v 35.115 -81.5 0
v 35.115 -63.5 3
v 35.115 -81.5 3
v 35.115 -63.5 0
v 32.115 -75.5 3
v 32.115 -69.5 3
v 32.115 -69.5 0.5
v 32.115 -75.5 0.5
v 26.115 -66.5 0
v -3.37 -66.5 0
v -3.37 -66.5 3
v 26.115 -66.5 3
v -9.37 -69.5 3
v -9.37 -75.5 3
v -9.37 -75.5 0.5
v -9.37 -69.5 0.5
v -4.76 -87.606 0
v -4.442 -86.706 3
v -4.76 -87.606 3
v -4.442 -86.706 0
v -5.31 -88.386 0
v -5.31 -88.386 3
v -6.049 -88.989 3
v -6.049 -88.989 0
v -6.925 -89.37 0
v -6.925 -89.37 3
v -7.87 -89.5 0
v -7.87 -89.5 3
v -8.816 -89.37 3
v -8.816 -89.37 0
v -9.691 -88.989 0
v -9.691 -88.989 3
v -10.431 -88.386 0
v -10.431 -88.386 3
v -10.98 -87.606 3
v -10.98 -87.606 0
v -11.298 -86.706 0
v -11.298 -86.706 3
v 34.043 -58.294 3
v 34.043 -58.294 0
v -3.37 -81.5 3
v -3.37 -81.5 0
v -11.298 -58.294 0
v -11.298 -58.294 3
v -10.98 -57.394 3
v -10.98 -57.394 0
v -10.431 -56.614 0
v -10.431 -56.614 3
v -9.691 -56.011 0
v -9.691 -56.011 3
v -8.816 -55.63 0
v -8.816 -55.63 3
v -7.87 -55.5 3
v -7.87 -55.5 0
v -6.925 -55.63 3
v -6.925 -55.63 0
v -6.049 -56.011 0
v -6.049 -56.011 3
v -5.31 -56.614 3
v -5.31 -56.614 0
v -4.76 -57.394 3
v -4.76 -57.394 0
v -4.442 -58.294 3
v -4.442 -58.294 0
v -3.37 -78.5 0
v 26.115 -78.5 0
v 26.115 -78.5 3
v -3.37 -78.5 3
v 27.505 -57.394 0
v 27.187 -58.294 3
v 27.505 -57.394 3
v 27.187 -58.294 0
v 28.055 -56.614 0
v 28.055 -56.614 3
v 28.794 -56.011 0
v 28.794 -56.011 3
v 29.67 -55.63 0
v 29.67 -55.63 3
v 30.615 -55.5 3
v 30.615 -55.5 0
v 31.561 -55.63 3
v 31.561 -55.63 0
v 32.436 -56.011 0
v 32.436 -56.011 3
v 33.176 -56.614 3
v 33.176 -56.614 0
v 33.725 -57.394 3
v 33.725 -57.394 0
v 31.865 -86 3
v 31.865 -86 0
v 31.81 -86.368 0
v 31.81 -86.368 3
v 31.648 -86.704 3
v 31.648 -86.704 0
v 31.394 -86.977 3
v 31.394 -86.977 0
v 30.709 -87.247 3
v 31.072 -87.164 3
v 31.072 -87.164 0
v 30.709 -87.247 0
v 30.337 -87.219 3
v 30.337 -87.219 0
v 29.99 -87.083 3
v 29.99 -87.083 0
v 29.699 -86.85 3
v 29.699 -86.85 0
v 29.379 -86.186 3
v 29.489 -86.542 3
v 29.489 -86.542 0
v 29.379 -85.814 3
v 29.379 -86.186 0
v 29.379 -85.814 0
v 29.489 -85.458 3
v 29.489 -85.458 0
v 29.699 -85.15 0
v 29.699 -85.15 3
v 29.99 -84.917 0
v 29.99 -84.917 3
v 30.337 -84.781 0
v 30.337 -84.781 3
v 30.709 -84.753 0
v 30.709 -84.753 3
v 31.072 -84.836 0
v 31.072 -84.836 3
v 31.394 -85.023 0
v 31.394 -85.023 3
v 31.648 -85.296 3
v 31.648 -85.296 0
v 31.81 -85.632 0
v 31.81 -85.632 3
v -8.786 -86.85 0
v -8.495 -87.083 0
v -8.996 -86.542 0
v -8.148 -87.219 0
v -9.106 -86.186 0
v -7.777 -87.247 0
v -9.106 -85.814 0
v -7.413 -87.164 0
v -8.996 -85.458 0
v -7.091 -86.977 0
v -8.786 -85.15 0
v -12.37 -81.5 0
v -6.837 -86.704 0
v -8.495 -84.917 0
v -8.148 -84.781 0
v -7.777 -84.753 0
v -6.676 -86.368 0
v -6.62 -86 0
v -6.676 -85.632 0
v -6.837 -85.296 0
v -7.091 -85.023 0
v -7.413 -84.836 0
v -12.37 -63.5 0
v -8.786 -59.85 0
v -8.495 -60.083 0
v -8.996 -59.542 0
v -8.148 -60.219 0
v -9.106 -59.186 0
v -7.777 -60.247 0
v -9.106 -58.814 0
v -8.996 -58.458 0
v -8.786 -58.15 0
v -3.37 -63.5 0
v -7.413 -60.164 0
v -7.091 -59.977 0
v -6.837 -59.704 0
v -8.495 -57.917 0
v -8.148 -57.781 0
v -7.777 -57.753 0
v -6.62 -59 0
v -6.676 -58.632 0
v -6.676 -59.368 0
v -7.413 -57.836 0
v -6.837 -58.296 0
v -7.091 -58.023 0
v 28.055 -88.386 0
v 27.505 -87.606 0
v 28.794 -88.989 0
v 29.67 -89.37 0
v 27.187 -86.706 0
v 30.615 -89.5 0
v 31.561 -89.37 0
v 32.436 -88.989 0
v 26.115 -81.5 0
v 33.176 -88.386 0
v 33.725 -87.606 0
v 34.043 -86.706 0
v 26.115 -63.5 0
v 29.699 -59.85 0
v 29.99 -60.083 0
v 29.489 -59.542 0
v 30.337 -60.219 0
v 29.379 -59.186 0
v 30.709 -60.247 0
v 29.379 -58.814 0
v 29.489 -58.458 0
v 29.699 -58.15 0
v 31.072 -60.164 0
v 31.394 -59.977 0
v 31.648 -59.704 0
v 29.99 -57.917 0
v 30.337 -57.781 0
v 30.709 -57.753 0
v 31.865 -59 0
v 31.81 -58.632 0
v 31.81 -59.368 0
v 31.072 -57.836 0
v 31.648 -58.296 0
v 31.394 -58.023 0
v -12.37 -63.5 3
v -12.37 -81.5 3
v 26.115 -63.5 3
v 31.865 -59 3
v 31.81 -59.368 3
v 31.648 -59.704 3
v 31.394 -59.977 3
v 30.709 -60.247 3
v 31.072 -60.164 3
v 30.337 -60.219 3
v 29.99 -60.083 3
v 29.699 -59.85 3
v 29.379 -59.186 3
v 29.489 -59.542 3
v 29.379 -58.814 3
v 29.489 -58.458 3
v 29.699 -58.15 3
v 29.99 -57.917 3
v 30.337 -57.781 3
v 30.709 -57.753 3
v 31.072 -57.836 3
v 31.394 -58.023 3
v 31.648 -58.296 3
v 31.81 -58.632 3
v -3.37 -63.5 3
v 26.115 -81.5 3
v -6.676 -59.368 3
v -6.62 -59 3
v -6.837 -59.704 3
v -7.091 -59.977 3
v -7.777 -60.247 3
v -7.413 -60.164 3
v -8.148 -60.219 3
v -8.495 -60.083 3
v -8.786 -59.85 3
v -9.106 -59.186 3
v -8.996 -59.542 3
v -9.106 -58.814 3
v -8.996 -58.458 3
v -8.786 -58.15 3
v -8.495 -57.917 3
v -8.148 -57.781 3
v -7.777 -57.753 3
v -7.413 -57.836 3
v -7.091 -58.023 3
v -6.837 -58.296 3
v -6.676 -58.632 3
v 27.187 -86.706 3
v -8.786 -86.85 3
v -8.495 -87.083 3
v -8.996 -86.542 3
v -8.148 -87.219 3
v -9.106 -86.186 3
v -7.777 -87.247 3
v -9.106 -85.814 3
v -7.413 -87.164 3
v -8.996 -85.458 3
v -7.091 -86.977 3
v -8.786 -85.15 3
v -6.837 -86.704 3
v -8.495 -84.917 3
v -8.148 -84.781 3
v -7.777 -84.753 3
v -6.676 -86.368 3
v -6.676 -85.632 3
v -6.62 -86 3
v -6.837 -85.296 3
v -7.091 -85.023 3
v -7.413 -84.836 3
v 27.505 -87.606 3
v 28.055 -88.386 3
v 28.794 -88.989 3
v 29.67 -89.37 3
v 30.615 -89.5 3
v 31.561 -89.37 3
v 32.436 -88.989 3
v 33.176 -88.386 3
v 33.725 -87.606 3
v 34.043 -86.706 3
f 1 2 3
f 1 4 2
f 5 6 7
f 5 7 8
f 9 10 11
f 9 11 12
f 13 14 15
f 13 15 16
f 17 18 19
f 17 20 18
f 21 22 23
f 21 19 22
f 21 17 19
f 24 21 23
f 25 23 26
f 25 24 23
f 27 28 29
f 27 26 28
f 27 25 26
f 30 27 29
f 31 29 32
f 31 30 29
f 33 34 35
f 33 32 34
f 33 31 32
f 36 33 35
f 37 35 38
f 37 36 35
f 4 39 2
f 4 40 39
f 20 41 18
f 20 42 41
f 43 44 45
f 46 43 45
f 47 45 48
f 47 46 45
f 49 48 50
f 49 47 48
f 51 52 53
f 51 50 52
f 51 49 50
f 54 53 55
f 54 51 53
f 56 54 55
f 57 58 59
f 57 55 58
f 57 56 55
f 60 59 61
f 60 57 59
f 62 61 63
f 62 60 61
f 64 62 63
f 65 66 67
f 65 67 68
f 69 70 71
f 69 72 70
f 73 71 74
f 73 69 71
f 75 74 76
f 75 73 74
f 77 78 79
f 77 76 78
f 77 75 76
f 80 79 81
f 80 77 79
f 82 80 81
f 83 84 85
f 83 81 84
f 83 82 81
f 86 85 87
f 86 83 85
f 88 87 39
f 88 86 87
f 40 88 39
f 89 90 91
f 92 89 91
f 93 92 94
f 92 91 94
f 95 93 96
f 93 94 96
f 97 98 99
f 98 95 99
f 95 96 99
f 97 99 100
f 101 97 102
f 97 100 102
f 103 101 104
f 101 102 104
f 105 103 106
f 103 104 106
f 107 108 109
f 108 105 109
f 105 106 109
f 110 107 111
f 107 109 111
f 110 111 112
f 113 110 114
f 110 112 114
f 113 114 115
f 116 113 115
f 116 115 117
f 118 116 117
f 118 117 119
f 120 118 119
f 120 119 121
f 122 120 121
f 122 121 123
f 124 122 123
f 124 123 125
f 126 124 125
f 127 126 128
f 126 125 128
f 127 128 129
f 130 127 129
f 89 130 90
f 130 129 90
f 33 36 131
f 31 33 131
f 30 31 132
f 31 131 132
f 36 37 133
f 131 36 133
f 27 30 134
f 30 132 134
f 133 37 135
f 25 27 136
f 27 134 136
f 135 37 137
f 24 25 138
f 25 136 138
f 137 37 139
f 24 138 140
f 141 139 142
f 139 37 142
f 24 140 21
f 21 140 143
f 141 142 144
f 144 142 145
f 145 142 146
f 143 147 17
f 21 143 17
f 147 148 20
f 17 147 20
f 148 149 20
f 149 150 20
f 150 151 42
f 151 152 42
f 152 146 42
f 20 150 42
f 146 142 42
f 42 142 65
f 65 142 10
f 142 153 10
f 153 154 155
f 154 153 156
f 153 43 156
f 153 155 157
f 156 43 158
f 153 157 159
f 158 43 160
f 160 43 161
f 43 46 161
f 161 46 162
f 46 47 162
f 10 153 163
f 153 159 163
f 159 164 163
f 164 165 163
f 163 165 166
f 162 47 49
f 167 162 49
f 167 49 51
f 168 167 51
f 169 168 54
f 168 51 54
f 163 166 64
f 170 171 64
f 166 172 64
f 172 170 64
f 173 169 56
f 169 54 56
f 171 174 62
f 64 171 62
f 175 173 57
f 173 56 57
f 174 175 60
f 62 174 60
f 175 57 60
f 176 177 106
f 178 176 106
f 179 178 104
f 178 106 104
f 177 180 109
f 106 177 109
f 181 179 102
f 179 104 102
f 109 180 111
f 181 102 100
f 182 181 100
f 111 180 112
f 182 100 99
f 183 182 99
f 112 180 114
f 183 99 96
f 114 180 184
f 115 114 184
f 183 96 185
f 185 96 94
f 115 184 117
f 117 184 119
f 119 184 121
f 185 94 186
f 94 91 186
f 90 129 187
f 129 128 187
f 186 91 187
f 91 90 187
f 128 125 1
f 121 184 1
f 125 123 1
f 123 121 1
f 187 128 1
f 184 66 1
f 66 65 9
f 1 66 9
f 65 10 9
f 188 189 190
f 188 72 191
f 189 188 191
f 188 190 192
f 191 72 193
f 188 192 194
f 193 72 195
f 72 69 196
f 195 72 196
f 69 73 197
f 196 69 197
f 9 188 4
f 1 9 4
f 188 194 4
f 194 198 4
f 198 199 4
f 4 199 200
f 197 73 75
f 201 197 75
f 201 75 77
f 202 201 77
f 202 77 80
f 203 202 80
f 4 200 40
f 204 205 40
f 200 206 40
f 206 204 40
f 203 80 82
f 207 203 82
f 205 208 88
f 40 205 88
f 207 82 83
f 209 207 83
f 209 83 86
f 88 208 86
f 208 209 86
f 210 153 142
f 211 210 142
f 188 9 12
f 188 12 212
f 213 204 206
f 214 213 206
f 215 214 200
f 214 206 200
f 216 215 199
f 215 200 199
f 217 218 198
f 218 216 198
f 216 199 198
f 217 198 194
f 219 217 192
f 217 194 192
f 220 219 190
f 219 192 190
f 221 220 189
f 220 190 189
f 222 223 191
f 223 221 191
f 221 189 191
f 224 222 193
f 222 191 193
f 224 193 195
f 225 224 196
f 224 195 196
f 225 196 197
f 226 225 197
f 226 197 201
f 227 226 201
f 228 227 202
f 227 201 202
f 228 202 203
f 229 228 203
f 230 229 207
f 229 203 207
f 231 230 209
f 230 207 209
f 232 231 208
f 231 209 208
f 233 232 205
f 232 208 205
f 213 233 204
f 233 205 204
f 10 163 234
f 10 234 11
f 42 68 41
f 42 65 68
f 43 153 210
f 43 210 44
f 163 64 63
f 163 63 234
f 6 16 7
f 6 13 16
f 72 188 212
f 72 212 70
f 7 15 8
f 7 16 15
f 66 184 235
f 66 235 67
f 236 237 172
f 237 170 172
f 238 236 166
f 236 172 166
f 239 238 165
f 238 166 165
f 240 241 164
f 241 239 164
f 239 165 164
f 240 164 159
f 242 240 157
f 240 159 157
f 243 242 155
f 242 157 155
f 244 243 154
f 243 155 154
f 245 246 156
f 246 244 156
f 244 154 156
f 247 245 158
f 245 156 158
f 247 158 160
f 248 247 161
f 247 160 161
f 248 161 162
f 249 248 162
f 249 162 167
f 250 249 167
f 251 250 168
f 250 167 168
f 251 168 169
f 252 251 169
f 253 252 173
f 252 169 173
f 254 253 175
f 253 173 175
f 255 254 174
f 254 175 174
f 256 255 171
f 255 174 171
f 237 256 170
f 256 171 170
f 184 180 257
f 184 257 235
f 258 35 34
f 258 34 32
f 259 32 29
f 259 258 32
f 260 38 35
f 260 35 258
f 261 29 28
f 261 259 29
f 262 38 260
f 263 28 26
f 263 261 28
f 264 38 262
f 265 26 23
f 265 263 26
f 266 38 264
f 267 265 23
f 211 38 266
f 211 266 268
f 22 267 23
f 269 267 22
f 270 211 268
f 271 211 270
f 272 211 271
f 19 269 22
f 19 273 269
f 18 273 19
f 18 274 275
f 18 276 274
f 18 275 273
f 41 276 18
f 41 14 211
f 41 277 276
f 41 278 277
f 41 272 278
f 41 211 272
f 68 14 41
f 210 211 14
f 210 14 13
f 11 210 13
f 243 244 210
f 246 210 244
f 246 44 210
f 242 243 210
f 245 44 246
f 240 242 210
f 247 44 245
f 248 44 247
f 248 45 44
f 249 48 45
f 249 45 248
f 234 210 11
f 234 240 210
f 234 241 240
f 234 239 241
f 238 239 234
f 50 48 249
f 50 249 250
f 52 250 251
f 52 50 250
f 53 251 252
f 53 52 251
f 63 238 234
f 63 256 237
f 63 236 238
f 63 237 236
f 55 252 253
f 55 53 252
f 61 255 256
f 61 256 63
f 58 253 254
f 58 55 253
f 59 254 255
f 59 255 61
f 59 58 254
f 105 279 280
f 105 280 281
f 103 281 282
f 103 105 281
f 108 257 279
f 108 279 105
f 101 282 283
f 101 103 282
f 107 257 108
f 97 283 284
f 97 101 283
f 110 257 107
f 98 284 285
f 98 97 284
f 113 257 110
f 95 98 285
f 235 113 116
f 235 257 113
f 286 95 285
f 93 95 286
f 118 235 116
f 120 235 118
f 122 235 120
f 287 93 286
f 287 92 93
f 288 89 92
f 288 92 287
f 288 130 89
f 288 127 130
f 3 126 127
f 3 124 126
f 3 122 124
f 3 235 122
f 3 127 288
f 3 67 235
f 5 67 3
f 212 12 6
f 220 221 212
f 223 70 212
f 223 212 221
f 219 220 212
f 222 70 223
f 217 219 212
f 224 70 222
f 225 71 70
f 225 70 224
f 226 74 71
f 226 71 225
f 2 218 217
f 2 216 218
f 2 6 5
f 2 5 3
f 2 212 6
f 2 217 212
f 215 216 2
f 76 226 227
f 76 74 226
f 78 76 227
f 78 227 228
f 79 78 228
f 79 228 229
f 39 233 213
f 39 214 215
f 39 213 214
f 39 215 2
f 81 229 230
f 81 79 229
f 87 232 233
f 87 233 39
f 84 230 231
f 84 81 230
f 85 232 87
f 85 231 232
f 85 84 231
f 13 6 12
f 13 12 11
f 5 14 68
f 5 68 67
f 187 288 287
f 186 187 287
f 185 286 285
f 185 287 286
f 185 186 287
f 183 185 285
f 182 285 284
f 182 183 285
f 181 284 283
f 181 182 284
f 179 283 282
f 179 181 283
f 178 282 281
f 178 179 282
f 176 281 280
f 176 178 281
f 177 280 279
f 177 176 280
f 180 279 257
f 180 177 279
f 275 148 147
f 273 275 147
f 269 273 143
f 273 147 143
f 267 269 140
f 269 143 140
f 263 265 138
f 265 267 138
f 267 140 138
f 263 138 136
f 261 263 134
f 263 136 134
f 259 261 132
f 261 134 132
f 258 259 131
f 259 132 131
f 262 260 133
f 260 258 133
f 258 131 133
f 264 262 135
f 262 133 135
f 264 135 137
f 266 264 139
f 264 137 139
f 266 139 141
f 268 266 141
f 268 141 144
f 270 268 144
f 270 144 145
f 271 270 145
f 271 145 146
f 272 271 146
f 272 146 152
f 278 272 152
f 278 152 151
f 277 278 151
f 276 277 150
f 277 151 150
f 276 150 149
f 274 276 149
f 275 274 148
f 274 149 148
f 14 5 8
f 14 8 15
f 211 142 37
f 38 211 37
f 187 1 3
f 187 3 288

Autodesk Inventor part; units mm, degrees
ref_plane "YZ Plane" through (0, 0, 0) normal (1, 0, 0) x (0, 1, 0)
ref_plane "XZ Plane" through (0, 0, 0) normal (0, 1, 0) x (-1, 0, 0)
ref_plane "XY Plane" through (0, 0, 0) normal (0, 0, 1) x (1, 0, 0)
sketch "スケッチ1" plane through (0, 0, 0) normal (0, 0, 1) x (1, 0, 0)
  circle A0 centre (50.4, -4.5) radius 1.5
  circle A1 centre (50.4, -59) radius 1.5
  circle A2 centre (50.4, -86) radius 1.5
  circle A3 centre (50.4, -173.5) radius 1.5
  circle A4 centre (30.9, -4.5) radius 1.5
  circle A5 centre (30.9, -173.5) radius 1.5
  circle A6 centre (75.4, -4.5) radius 1.5
  circle A7 centre (75.4, -173.5) radius 1.5
  line L0 (38.1151, -78.5) -> (38.1151, -81.5)
  arc A8 (36.0151, -81.5) -> (38.1151, -81.5) centre (37.0651, -81.5) ccw
  line L1 (36.0151, -81.5) -> (25.2151, -81.5)
  arc A9 (23.1151, -81.5) -> (25.2151, -81.5) centre (24.1651, -81.5) ccw
  line L2 (23.1151, -81.5) -> (23.1151, -78.5)
  arc A10 (25.2151, -78.5) -> (23.1151, -78.5) centre (24.1651, -78.5) ccw
  line L3 (25.2151, -78.5) -> (36.0151, -78.5)
  arc A11 (38.1151, -78.5) -> (36.0151, -78.5) centre (37.0651, -78.5) ccw
  line L4 (-15.3701, -66.5) -> (-15.3701, -63.5)
  arc A12 (-13.2701, -63.5) -> (-15.3701, -63.5) centre (-14.3201, -63.5) ccw
  line L5 (-13.2701, -63.5) -> (-2.4701, -63.5)
  arc A13 (-0.3701, -63.5) -> (-2.4701, -63.5) centre (-1.4201, -63.5) ccw
  line L6 (-0.3701, -63.5) -> (-0.3701, -66.5)
  arc A14 (-2.4701, -66.5) -> (-0.3701, -66.5) centre (-1.4201, -66.5) ccw
  line L7 (-2.4701, -66.5) -> (-13.2701, -66.5)
  arc A15 (-15.3701, -66.5) -> (-13.2701, -66.5) centre (-14.3201, -66.5) ccw
  line L8 (-0.3701, -78.5) -> (-0.3701, -81.5)
  arc A16 (-2.4701, -81.5) -> (-0.3701, -81.5) centre (-1.4201, -81.5) ccw
  line L9 (-2.4701, -81.5) -> (-13.2701, -81.5)
  arc A17 (-15.3701, -81.5) -> (-13.2701, -81.5) centre (-14.3201, -81.5) ccw
  line L10 (-15.3701, -81.5) -> (-15.3701, -78.5)
  arc A18 (-13.2701, -78.5) -> (-15.3701, -78.5) centre (-14.3201, -78.5) ccw
  line L11 (-13.2701, -78.5) -> (-2.4701, -78.5)
  arc A19 (-0.3701, -78.5) -> (-2.4701, -78.5) centre (-1.4201, -78.5) ccw
  line L12 (23.1151, -66.5) -> (23.1151, -63.5)
  arc A20 (25.2151, -63.5) -> (23.1151, -63.5) centre (24.1651, -63.5) ccw
  line L13 (25.2151, -63.5) -> (36.0151, -63.5)
  arc A21 (38.1151, -63.5) -> (36.0151, -63.5) centre (37.0651, -63.5) ccw
  line L14 (38.1151, -63.5) -> (38.1151, -66.5)
  arc A22 (36.0151, -66.5) -> (38.1151, -66.5) centre (37.0651, -66.5) ccw
  line L15 (36.0151, -66.5) -> (25.2151, -66.5)
  arc A23 (23.1151, -66.5) -> (25.2151, -66.5) centre (24.1651, -66.5) ccw
  line L16 (-108.585, -50) -> (-111.585, -50)
  line L17 (-111.585, -50) -> (-111.585, -128)
  line L18 (-111.585, -128) -> (-108.585, -128)
  arc A24 (-108.585, -130.1) -> (-108.585, -128) centre (-108.585, -129.05) ccw
  line L19 (-108.585, -130.1) -> (-108.585, -140.9)
  arc A25 (-108.585, -143) -> (-108.585, -140.9) centre (-108.585, -141.95) ccw
  line L20 (-108.585, -143) -> (-111.585, -143)
  line L21 (-111.585, -143) -> (-111.585, -168)
  line L22 (-111.585, -168) -> (-108.585, -168)
  line L23 (-108.585, -168) -> (-108.585, -165)
  arc A26 (-106.485, -165) -> (-108.585, -165) centre (-107.535, -165) ccw
  line L24 (-106.485, -165) -> (-95.685, -165)
  arc A27 (-93.585, -165) -> (-95.685, -165) centre (-94.635, -165) ccw
  line L25 (-93.585, -165) -> (-93.585, -168)
  line L26 (-93.585, -168) -> (-20.5995, -168)
  line L27 (-20.5995, -168) -> (-20.5995, -165)
  arc A28 (-18.4995, -165) -> (-20.5995, -165) centre (-19.5495, -165) ccw
  line L28 (-18.4995, -165) -> (-7.6995, -165)
  arc A29 (-5.5995, -165) -> (-7.6995, -165) centre (-6.6495, -165) ccw
  line L29 (-5.5995, -165) -> (-5.5995, -168)
  line L30 (-5.5995, -168) -> (21.4, -168)
  arc A30 (26.4, -173) -> (21.4, -168) centre (21.4, -173) ccw
  line L31 (26.4, -173) -> (26.4, -178)
  line L32 (26.4, -178) -> (40.3, -178)
  arc A31 (42.4, -178) -> (40.3, -178) centre (41.35, -178) ccw
  line L33 (42.4, -178) -> (42.4, -181)
  line L34 (42.4, -181) -> (67.4, -181)
  line L35 (67.4, -181) -> (67.4, -178)
  arc A32 (69.5, -178) -> (67.4, -178) centre (68.45, -178) ccw
  line L36 (69.5, -178) -> (79.9, -178)
  line L37 (79.9, -178) -> (79.9, -164.3045)
  line L38 (79.9, -164.3045) -> (54.9, -129)
  line L39 (54.9, -129) -> (54.9, -49)
  line L40 (54.9, -49) -> (79.9, -13.6955)
  line L41 (79.9, -13.6955) -> (79.9, 0)
  line L42 (79.9, 0) -> (69.5, 0)
  arc A33 (67.4, 0) -> (69.5, 0) centre (68.45, 0) ccw
  line L43 (67.4, 0) -> (67.4, 3)
  line L44 (67.4, 3) -> (42.4, 3)
  line L45 (42.4, 3) -> (42.4, 0)
  arc A34 (40.3, 0) -> (42.4, 0) centre (41.35, 0) ccw
  line L46 (40.3, 0) -> (26.4, 0)
  line L47 (26.4, 0) -> (26.4, -5)
  arc A35 (21.4, -10) -> (26.4, -5) centre (21.4, -5) ccw
  line L48 (21.4, -10) -> (-5.5995, -10)
  line L49 (-5.5995, -10) -> (-5.5995, -13)
  arc A36 (-7.6995, -13) -> (-5.5995, -13) centre (-6.6495, -13) ccw
  line L50 (-7.6995, -13) -> (-18.4995, -13)
  arc A37 (-20.5995, -13) -> (-18.4995, -13) centre (-19.5495, -13) ccw
  line L51 (-20.5995, -13) -> (-20.5995, -10)
  line L52 (-20.5995, -10) -> (-93.585, -10)
  line L53 (-93.585, -10) -> (-93.585, -13)
  arc A38 (-95.685, -13) -> (-93.585, -13) centre (-94.635, -13) ccw
  line L54 (-95.685, -13) -> (-106.485, -13)
  arc A39 (-108.585, -13) -> (-106.485, -13) centre (-107.535, -13) ccw
  line L55 (-108.585, -13) -> (-108.585, -10)
  line L56 (-108.585, -10) -> (-111.585, -10)
  line L57 (-111.585, -10) -> (-111.585, -35)
  line L58 (-111.585, -35) -> (-108.585, -35)
  arc A40 (-108.585, -37.1) -> (-108.585, -35) centre (-108.585, -36.05) ccw
  line L59 (-108.585, -37.1) -> (-108.585, -47.9)
  arc A41 (-108.585, -50) -> (-108.585, -47.9) centre (-108.585, -48.95) ccw
  circle A42 centre (-13.0995, -160.5) radius 1.5
  circle A43 centre (-7.8701, -86) radius 1.5
  circle A44 centre (-104.085, -42.5) radius 1.5
  circle A45 centre (-101.085, -17.5) radius 1.5
  circle A46 centre (30.6151, -86) radius 1.5
  circle A47 centre (-101.085, -160.5) radius 1.5
  circle A48 centre (-7.8701, -59) radius 1.5
  circle A49 centre (-13.0995, -17.5) radius 1.5
  circle A50 centre (30.6151, -59) radius 1.5
  circle A51 centre (-104.085, -135.5) radius 1.5
  line L60 (41.7169, -52.0665) -> (40.5915, -53.6558)
  arc A52 (38.9593, -54.5) -> (40.5915, -53.6558) centre (38.9593, -52.5) ccw
  line L61 (38.9593, -54.5) -> (24.9, -54.5)
  arc A53 (22.9, -52.5) -> (24.9, -54.5) centre (24.9, -52.5) ccw
  line L62 (22.9, -52.5) -> (22.9, -23.5284)
  arc A54 (26.6491, -22.5585) -> (22.9, -23.5284) centre (24.9, -23.5284) ccw
  line L63 (26.6491, -22.5585) -> (41.8338, -49.9408)
  arc A55 (41.7169, -52.0665) -> (41.8338, -49.9408) centre (40.0847, -50.9107) ccw
  arc A56 (-15.846, -59.7485) -> (-18.3701, -63.5) centre (-14.3201, -63.5) ccw
  line L64 (-18.3701, -63.5) -> (-18.3701, -66.5)
  arc A57 (-18.3701, -66.5) -> (-15.846, -70.2515) centre (-14.3201, -66.5) ccw
  arc A58 (-14.5995, -72.1042) -> (-15.846, -70.2515) centre (-16.5995, -72.1042) ccw
  line L65 (-14.5995, -72.1042) -> (-14.5995, -72.8958)
  arc A59 (-15.846, -74.7485) -> (-14.5995, -72.8958) centre (-16.5995, -72.8958) ccw
  arc A60 (-15.846, -74.7485) -> (-18.3701, -78.5) centre (-14.3201, -78.5) ccw
  line L66 (-18.3701, -78.5) -> (-18.3701, -81.5)
  arc A61 (-18.3701, -81.5) -> (-17.3586, -84.1777) centre (-14.3201, -81.5) ccw
  arc A62 (-18.8591, -87.5) -> (-17.3586, -84.1777) centre (-18.8591, -85.5) ccw
  line L67 (-18.8591, -87.5) -> (-50.8293, -87.5)
  arc A63 (-52.5327, -84.4519) -> (-50.8293, -87.5) centre (-50.8293, -85.5) ccw
  line L68 (-52.5327, -84.4519) -> (-18.3029, -28.8193)
  arc A64 (-14.5995, -29.8674) -> (-18.3029, -28.8193) centre (-16.5995, -29.8674) ccw
  line L69 (-14.5995, -29.8674) -> (-14.5995, -57.8958)
  arc A65 (-15.846, -59.7485) -> (-14.5995, -57.8958) centre (-16.5995, -57.8958) ccw
  arc A66 (36.4558, -117.8675) -> (36.8236, -119.0233) centre (38.4558, -117.8675) ccw
  line L70 (36.8236, -119.0233) -> (41.7169, -125.9335)
  arc A67 (41.8338, -128.0592) -> (41.7169, -125.9335) centre (40.0847, -127.0893) ccw
  line L71 (41.8338, -128.0592) -> (26.6491, -155.4415)
  arc A68 (22.9, -154.4716) -> (26.6491, -155.4415) centre (24.9, -154.4716) ccw
  line L72 (22.9, -154.4716) -> (22.9, -92.5)
  arc A69 (24.9, -90.5) -> (22.9, -92.5) centre (24.9, -92.5) ccw
  line L73 (24.9, -90.5) -> (34.4558, -90.5)
  arc A70 (36.4558, -92.5) -> (34.4558, -90.5) centre (34.4558, -92.5) ccw
  line L74 (36.4558, -92.5) -> (36.4558, -117.8675)
  line L75 (68.3465, -169) -> (30.9, -169)
  arc A71 (30.9, -169) -> (29.938, -169.104) centre (30.9, -173.5) ccw
  arc A72 (27.8884, -168.3202) -> (29.938, -169.104) centre (29.5105, -167.1502) ccw
  arc A73 (27.8884, -168.3202) -> (26.0095, -166.4614) centre (21.4, -173) ccw
  arc A74 (25.4128, -163.8569) -> (26.0095, -166.4614) centre (27.1618, -164.8268) ccw
  line L76 (25.4128, -163.8569) -> (42.8246, -132.4585)
  arc A75 (46.2058, -132.2726) -> (42.8246, -132.4585) centre (44.5736, -133.4285) ccw
  line L77 (46.2058, -132.2726) -> (69.9787, -165.8442)
  arc A76 (68.3465, -169) -> (69.9787, -165.8442) centre (68.3465, -167) ccw
  line L78 (-18.3029, -149.1807) -> (-52.5327, -93.5481)
  arc A77 (-50.8293, -90.5) -> (-52.5327, -93.5481) centre (-50.8293, -92.5) ccw
  line L79 (-50.8293, -90.5) -> (-16.5995, -90.5)
  arc A78 (-14.5995, -92.5) -> (-16.5995, -90.5) centre (-16.5995, -92.5) ccw
  line L80 (-14.5995, -92.5) -> (-14.5995, -148.1326)
  arc A79 (-18.3029, -149.1807) -> (-14.5995, -148.1326) centre (-16.5995, -148.1326) ccw
  line L81 (42.8246, -45.5415) -> (25.4128, -14.1431)
  arc A80 (26.0095, -11.5386) -> (25.4128, -14.1431) centre (27.1618, -13.1732) ccw
  arc A81 (26.0095, -11.5386) -> (27.8884, -9.6798) centre (21.4, -5) ccw
  arc A82 (29.938, -8.896) -> (27.8884, -9.6798) centre (29.5105, -10.8498) ccw
  arc A83 (29.938, -8.896) -> (30.9, -9) centre (30.9, -4.5) ccw
  line L82 (30.9, -9) -> (68.3465, -9)
  arc A84 (69.9787, -12.1558) -> (68.3465, -9) centre (68.3465, -11) ccw
  line L83 (69.9787, -12.1558) -> (46.2058, -45.7274)
  arc A85 (42.8246, -45.5415) -> (46.2058, -45.7274) centre (44.5736, -44.5715) ccw
  arc A86 (-10.6764, -21.2919) -> (-8.7291, -18.572) centre (-13.0995, -17.5) ccw
  arc A87 (-6.7413, -17.049) -> (-8.7291, -18.572) centre (-6.7866, -19.0484) ccw
  arc A88 (-6.7413, -17.049) -> (-2.8272, -14.3388) centre (-6.6495, -13) ccw
  arc A89 (-0.9396, -13) -> (-2.8272, -14.3388) centre (-0.9396, -15) ccw
  line L84 (-0.9396, -13) -> (17.9, -13)
  arc A90 (19.9, -15) -> (17.9, -13) centre (17.9, -15) ccw
  line L85 (19.9, -15) -> (19.9, -52.5)
  arc A91 (17.9, -54.5) -> (19.9, -52.5) centre (17.9, -52.5) ccw
  line L86 (17.9, -54.5) -> (-9.5995, -54.5)
  arc A92 (-11.5995, -52.5) -> (-9.5995, -54.5) centre (-9.5995, -52.5) ccw
  line L87 (-11.5995, -52.5) -> (-11.5995, -22.9772)
  arc A93 (-10.6764, -21.2919) -> (-11.5995, -22.9772) centre (-9.5995, -22.9772) ccw
  line L88 (-88.9251, -13) -> (-25.2594, -13)
  arc A94 (-23.3718, -14.3388) -> (-25.2594, -13) centre (-25.2594, -15) ccw
  arc A95 (-23.3718, -14.3388) -> (-19.4577, -17.049) centre (-19.5495, -13) ccw
  arc A96 (-17.47, -18.572) -> (-19.4577, -17.049) centre (-19.4124, -19.0484) ccw
  arc A97 (-17.47, -18.572) -> (-17.1503, -19.4598) centre (-13.0995, -17.5) ccw
  arc A98 (-17.2473, -21.3789) -> (-17.1503, -19.4598) centre (-18.9507, -20.3308) ccw
  line L89 (-17.2473, -21.3789) -> (-55.3889, -83.3691)
  arc A99 (-58.7956, -83.3691) -> (-55.3889, -83.3691) centre (-57.0923, -82.3211) ccw
  line L90 (-58.7956, -83.3691) -> (-96.9372, -21.3789)
  arc A100 (-97.0342, -19.4598) -> (-96.9372, -21.3789) centre (-95.2338, -20.3308) ccw
  arc A101 (-97.0342, -19.4598) -> (-96.7146, -18.572) centre (-101.085, -17.5) ccw
  arc A102 (-94.7268, -17.049) -> (-96.7146, -18.572) centre (-94.7721, -19.0484) ccw
  arc A103 (-94.7268, -17.049) -> (-90.8127, -14.3388) centre (-94.635, -13) ccw
  arc A104 (-88.9251, -13) -> (-90.8127, -14.3388) centre (-88.9251, -15) ccw
  line L91 (-9.5995, -90.5) -> (17.9, -90.5)
  arc A105 (19.9, -92.5) -> (17.9, -90.5) centre (17.9, -92.5) ccw
  line L92 (19.9, -92.5) -> (19.9, -163)
  arc A106 (17.9, -165) -> (19.9, -163) centre (17.9, -163) ccw
  line L93 (17.9, -165) -> (-0.9396, -165)
  arc A107 (-2.8272, -163.6612) -> (-0.9396, -165) centre (-0.9396, -163) ccw
  arc A108 (-2.8272, -163.6612) -> (-6.7413, -160.951) centre (-6.6495, -165) ccw
  arc A109 (-8.7291, -159.428) -> (-6.7413, -160.951) centre (-6.7866, -158.9516) ccw
  arc A110 (-8.7291, -159.428) -> (-10.6764, -156.7081) centre (-13.0995, -160.5) ccw
  arc A111 (-11.5995, -155.0228) -> (-10.6764, -156.7081) centre (-9.5995, -155.0228) ccw
  line L94 (-11.5995, -155.0228) -> (-11.5995, -92.5)
  arc A112 (-9.5995, -90.5) -> (-11.5995, -92.5) centre (-9.5995, -92.5) ccw
  arc A113 (-107.2462, -145.7723) -> (-104.536, -141.8582) centre (-108.585, -141.95) ccw
  arc A114 (-103.013, -139.8704) -> (-104.536, -141.8582) centre (-102.5366, -141.8129) ccw
  arc A115 (-103.013, -139.8704) -> (-103.013, -131.1296) centre (-104.085, -135.5) ccw
  arc A116 (-104.536, -129.1418) -> (-103.013, -131.1296) centre (-102.5366, -129.1871) ccw
  arc A117 (-104.536, -129.1418) -> (-107.2462, -125.2277) centre (-108.585, -129.05) ccw
  arc A118 (-108.585, -123.3401) -> (-107.2462, -125.2277) centre (-106.585, -123.3401) ccw
  line L95 (-108.585, -123.3401) -> (-108.585, -92.5)
  arc A119 (-106.585, -90.5) -> (-108.585, -92.5) centre (-106.585, -92.5) ccw
  line L96 (-106.585, -90.5) -> (-63.3552, -90.5)
  arc A120 (-61.6518, -93.5481) -> (-63.3552, -90.5) centre (-63.3552, -92.5) ccw
  line L97 (-61.6518, -93.5481) -> (-99.4923, -155.049)
  arc A121 (-101.1616, -156.0007) -> (-99.4923, -155.049) centre (-101.1957, -154.0009) ccw
  arc A122 (-101.1616, -156.0007) -> (-105.4554, -159.428) centre (-101.085, -160.5) ccw
  arc A123 (-107.4432, -160.951) -> (-105.4554, -159.428) centre (-107.3979, -158.9516) ccw
  arc A124 (-108.585, -159.1445) -> (-107.4432, -160.951) centre (-106.585, -159.1445) ccw
  line L98 (-108.585, -159.1445) -> (-108.585, -147.6599)
  arc A125 (-107.2462, -145.7723) -> (-108.585, -147.6599) centre (-106.585, -147.6599) ccw
  line L99 (-25.2594, -165) -> (-88.9251, -165)
  arc A126 (-90.8127, -163.6612) -> (-88.9251, -165) centre (-88.9251, -163) ccw
  arc A127 (-90.8127, -163.6612) -> (-94.7268, -160.951) centre (-94.635, -165) ccw
  arc A128 (-96.7146, -159.428) -> (-94.7268, -160.951) centre (-94.7721, -158.9516) ccw
  arc A129 (-96.7146, -159.428) -> (-97.0342, -158.5402) centre (-101.085, -160.5) ccw
  arc A130 (-96.9372, -156.6211) -> (-97.0342, -158.5402) centre (-95.2338, -157.6692) ccw
  line L100 (-96.9372, -156.6211) -> (-58.7956, -94.6309)
  arc A131 (-55.3889, -94.6309) -> (-58.7956, -94.6309) centre (-57.0923, -95.6789) ccw
  line L101 (-55.3889, -94.6309) -> (-17.2473, -156.6211)
  arc A132 (-17.1503, -158.5402) -> (-17.2473, -156.6211) centre (-18.9507, -157.6692) ccw
  arc A133 (-17.1503, -158.5402) -> (-17.47, -159.428) centre (-13.0995, -160.5) ccw
  arc A134 (-19.4577, -160.951) -> (-17.47, -159.428) centre (-19.4124, -158.9516) ccw
  arc A135 (-19.4577, -160.951) -> (-23.3718, -163.6612) centre (-19.5495, -165) ccw
  arc A136 (-25.2594, -165) -> (-23.3718, -163.6612) centre (-25.2594, -163) ccw
  line L102 (-4.8263, -75.5) -> (-9.5995, -75.5)
  arc A137 (-11.5995, -73.5) -> (-9.5995, -75.5) centre (-9.5995, -73.5) ccw
  line L103 (-11.5995, -73.5) -> (-11.5995, -71.5)
  arc A138 (-9.5995, -69.5) -> (-11.5995, -71.5) centre (-9.5995, -71.5) ccw
  line L104 (-9.5995, -69.5) -> (-4.8263, -69.5)
  arc A139 (-3.7003, -69.8471) -> (-4.8263, -69.5) centre (-4.8263, -71.5) ccw
  arc A140 (-3.7003, -69.8471) -> (2.4022, -67.8388) centre (-1.4201, -66.5) ccw
  arc A141 (4.2898, -66.5) -> (2.4022, -67.8388) centre (4.2898, -68.5) ccw
  line L105 (4.2898, -66.5) -> (17.9, -66.5)
  arc A142 (19.9, -68.5) -> (17.9, -66.5) centre (17.9, -68.5) ccw
  line L106 (19.9, -68.5) -> (19.9, -76.5)
  arc A143 (17.9, -78.5) -> (19.9, -76.5) centre (17.9, -76.5) ccw
  line L107 (17.9, -78.5) -> (4.2898, -78.5)
  arc A144 (2.4022, -77.1612) -> (4.2898, -78.5) centre (4.2898, -76.5) ccw
  arc A145 (2.4022, -77.1612) -> (-3.7003, -75.1529) centre (-1.4201, -78.5) ccw
  arc A146 (-4.8263, -75.5) -> (-3.7003, -75.1529) centre (-4.8263, -73.5) ccw
  arc A147 (-107.2462, -52.7723) -> (-104.536, -48.8582) centre (-108.585, -48.95) ccw
  arc A148 (-103.013, -46.8704) -> (-104.536, -48.8582) centre (-102.5366, -48.8129) ccw
  arc A149 (-103.013, -46.8704) -> (-103.013, -38.1296) centre (-104.085, -42.5) ccw
  arc A150 (-104.536, -36.1418) -> (-103.013, -38.1296) centre (-102.5366, -36.1871) ccw
  arc A151 (-104.536, -36.1418) -> (-107.2462, -32.2277) centre (-108.585, -36.05) ccw
  arc A152 (-108.585, -30.3401) -> (-107.2462, -32.2277) centre (-106.585, -30.3401) ccw
  line L108 (-108.585, -30.3401) -> (-108.585, -18.9749)
  arc A153 (-106.899, -16.9998) -> (-108.585, -18.9749) centre (-106.585, -18.9749) ccw
  arc A154 (-105.4749, -18.4894) -> (-106.899, -16.9998) centre (-107.426, -18.9291) ccw
  arc A155 (-105.4749, -18.4894) -> (-101.1616, -21.9993) centre (-101.085, -17.5) ccw
  arc A156 (-99.4923, -22.951) -> (-101.1616, -21.9993) centre (-101.1957, -23.9991) ccw
  line L109 (-99.4923, -22.951) -> (-61.6518, -84.4519)
  arc A157 (-63.3552, -87.5) -> (-61.6518, -84.4519) centre (-63.3552, -85.5) ccw
  line L110 (-63.3552, -87.5) -> (-106.585, -87.5)
  arc A158 (-108.585, -85.5) -> (-106.585, -87.5) centre (-106.585, -85.5) ccw
  line L111 (-108.585, -85.5) -> (-108.585, -54.6599)
  arc A159 (-107.2462, -52.7723) -> (-108.585, -54.6599) centre (-106.585, -54.6599) ccw
  line L112 (50.4, -4.5) -> (50.4, -173.5) construction
  line L113 (30.9, -4.5) -> (75.4, -4.5) construction
  line L114 (30.9, -173.5) -> (75.4, -173.5) construction
  line L115 (-7.8701, -86) -> (81.4809, -86) construction
  line L116 (-7.8701, -59) -> (87.5371, -59) construction
  point P0 (0, 0)
  point P1 (0, 0)
  dimension "d0" = 3
  dimension "d1" = 3
  dimension "d2" = 3
  dimension "d3" = 3
  dimension "d4" = 4.5
sketch "スケッチ2" plane through (0, 0, 0) normal (0, 0, 1) x (1, 0, 0)
  circle A0 centre (-7.8701, -59) radius 1.5 construction
  circle A1 centre (30.6151, -59) radius 1.5 construction
  circle A2 centre (30.6151, -86) radius 1.5 construction
  circle A3 centre (-7.8701, -86) radius 1.5 construction
  line L0 (-2.4701, -66.5) -> (-13.2701, -66.5) construction
  line L1 (-13.2701, -78.5) -> (-2.4701, -78.5) construction
  circle A4 centre (-7.8701, -59) radius 1.25
  circle A5 centre (30.6151, -59) radius 1.25
  circle A6 centre (-7.8701, -86) radius 1.25
  circle A7 centre (30.6151, -86) radius 1.25
  arc A8 (-11.2982, -86.7059) -> (-4.442, -86.7059) centre (-7.8701, -86) ccw
  arc A9 (27.187, -86.7059) -> (34.0432, -86.7059) centre (30.6151, -86) ccw
  arc A10 (34.0432, -58.2941) -> (27.187, -58.2941) centre (30.6151, -59) ccw
  arc A11 (-4.442, -58.2941) -> (-11.2982, -58.2941) centre (-7.8701, -59) ccw
  line L2 (-12.3701, -63.5) -> (-12.3701, -81.5)
  line L3 (-12.3701, -81.5) -> (-11.2982, -86.7059)
  line L4 (-12.3701, -63.5) -> (-11.2982, -58.2941)
  line L5 (-4.442, -58.2941) -> (-3.3701, -63.5)
  line L6 (-3.3701, -63.5) -> (-3.3701, -66.5)
  line L7 (-3.3701, -66.5) -> (26.1151, -66.5)
  line L8 (26.1151, -66.5) -> (26.1151, -63.5)
  line L9 (26.1151, -63.5) -> (27.187, -58.2941)
  line L10 (34.0432, -58.2941) -> (35.1151, -63.5)
  line L11 (35.1151, -63.5) -> (35.1151, -81.5)
  line L12 (35.1151, -81.5) -> (34.0432, -86.7059)
  line L13 (27.187, -86.7059) -> (26.1151, -81.5)
  line L14 (26.1151, -81.5) -> (26.1151, -78.5)
  line L15 (26.1151, -78.5) -> (-3.3701, -78.5)
  line L16 (-3.3701, -78.5) -> (-3.3701, -81.5)
  line L17 (-3.3701, -81.5) -> (-4.442, -86.7059)
  point P0 (0, 0)
  dimension "d5" = 2.5
  dimension "d6" = 2.5
  dimension "d7" = 2.5
  dimension "d8" = 2.5
  dimension "d9" = 7
  dimension "d10" = 7
  dimension "d11" = 7
  dimension "d12" = 7
  dimension "d13" = 9
  dimension "d14" = 4.5
  dimension "d15" = 4.5
  dimension "d16" = 9
  dimension "d17" = 3
  dimension "d18" = 3
  dimension "d19" = 3
  dimension "d20" = 3
  dimension "d21" = 3
extrude "押し出し1" add sketch "スケッチ2" along normal blind 3
sketch "スケッチ3" plane through (0, 0, 3) normal (0, 0, 1) x (1, 0, 0)
  arc A0 (-4.442, -58.2941) -> (-11.2982, -58.2941) centre (-7.8701, -59) ccw projected
  line L0 (-11.2982, -58.2941) -> (-12.3701, -63.5) projected
  line L1 (-12.3701, -63.5) -> (-12.3701, -81.5) projected
  line L2 (-12.3701, -81.5) -> (-11.2982, -86.7059) projected
  arc A1 (-11.2982, -86.7059) -> (-4.442, -86.7059) centre (-7.8701, -86) ccw projected
  line L3 (-4.442, -86.7059) -> (-3.3701, -81.5) projected
  line L4 (-3.3701, -81.5) -> (-3.3701, -78.5) projected
  line L5 (-3.3701, -78.5) -> (26.1151, -78.5) projected
  line L6 (26.1151, -78.5) -> (26.1151, -81.5) projected
  line L7 (26.1151, -81.5) -> (27.187, -86.7059) projected
  arc A2 (27.187, -86.7059) -> (34.0432, -86.7059) centre (30.6151, -86) ccw projected
  line L8 (34.0432, -86.7059) -> (35.1151, -81.5) projected
  line L9 (35.1151, -81.5) -> (35.1151, -63.5) projected
  line L10 (35.1151, -63.5) -> (34.0432, -58.2941) projected
  arc A3 (34.0432, -58.2941) -> (27.187, -58.2941) centre (30.6151, -59) ccw projected
  line L11 (27.187, -58.2941) -> (26.1151, -63.5) projected
  line L12 (26.1151, -63.5) -> (26.1151, -66.5) projected
  line L13 (26.1151, -66.5) -> (-3.3701, -66.5) projected
  line L14 (-3.3701, -66.5) -> (-3.3701, -63.5) projected
  line L15 (-3.3701, -63.5) -> (-4.442, -58.2941) projected
  circle A4 centre (-7.8701, -59) radius 1.25 projected
  circle A5 centre (30.6151, -59) radius 1.25 projected
  circle A6 centre (-7.8701, -86) radius 1.25 projected
  circle A7 centre (30.6151, -86) radius 1.25 projected
  line L16 (-9.3701, -69.5) -> (32.1151, -69.5)
  line L17 (32.1151, -69.5) -> (32.1151, -75.5)
  line L18 (32.1151, -75.5) -> (-9.3701, -75.5)
  line L19 (-9.3701, -75.5) -> (-9.3701, -69.5)
  point P0 (0, 0)
  dimension "d24" = 3
  dimension "d25" = 3
  dimension "d26" = 3
  dimension "d27" = 3
extrude "押し出し2" cut sketch "スケッチ3" against normal blind 2.5 contours L16 L17 L18 L19
properties part number "アーム下板"
